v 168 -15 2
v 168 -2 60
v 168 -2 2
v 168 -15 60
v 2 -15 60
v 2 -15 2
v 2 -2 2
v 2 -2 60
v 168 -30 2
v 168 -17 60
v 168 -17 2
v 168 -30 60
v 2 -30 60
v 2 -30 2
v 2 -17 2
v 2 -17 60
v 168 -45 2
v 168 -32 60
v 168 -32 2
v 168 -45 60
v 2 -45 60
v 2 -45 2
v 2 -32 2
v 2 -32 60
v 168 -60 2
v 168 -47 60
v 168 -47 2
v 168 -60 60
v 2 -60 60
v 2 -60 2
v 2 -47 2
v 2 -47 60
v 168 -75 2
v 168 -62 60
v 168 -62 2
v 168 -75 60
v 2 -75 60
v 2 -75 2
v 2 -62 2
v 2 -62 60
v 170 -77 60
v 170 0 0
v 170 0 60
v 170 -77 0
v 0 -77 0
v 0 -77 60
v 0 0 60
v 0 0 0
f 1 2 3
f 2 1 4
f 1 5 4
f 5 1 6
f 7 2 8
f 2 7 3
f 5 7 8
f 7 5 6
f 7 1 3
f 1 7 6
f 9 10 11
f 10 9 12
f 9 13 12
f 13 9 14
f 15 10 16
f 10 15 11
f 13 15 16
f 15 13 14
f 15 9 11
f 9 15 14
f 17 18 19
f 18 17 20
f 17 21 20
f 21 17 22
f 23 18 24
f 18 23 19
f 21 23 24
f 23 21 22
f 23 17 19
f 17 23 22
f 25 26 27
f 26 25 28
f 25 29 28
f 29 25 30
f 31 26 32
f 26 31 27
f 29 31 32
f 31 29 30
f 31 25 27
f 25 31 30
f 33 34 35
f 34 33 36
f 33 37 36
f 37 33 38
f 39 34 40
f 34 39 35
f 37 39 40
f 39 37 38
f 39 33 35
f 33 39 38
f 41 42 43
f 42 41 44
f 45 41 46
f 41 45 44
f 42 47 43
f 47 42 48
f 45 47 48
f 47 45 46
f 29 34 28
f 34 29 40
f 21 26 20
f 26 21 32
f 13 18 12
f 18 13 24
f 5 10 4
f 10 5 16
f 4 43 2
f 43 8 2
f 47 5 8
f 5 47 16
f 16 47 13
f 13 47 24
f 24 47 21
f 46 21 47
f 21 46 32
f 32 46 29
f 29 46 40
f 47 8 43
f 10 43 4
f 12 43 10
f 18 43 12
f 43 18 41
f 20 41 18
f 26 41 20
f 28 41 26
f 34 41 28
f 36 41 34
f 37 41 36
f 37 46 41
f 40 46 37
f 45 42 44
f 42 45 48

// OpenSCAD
// Cooling tower for dreikraftschoki silicone molds. Place the filled molds
// in it, then put it into the fridge.

capacity = 5;

module tower() {
	difference() {
		cube([160 + 10, 60, 15 * capacity + 2]);
		for (i = [0 : capacity-1]) {
			translate([2, 2, 15 * i + 2]) cube([160 + 6, 60, 13]);
		}
	}
}

rotate([90,0,0]) tower();
